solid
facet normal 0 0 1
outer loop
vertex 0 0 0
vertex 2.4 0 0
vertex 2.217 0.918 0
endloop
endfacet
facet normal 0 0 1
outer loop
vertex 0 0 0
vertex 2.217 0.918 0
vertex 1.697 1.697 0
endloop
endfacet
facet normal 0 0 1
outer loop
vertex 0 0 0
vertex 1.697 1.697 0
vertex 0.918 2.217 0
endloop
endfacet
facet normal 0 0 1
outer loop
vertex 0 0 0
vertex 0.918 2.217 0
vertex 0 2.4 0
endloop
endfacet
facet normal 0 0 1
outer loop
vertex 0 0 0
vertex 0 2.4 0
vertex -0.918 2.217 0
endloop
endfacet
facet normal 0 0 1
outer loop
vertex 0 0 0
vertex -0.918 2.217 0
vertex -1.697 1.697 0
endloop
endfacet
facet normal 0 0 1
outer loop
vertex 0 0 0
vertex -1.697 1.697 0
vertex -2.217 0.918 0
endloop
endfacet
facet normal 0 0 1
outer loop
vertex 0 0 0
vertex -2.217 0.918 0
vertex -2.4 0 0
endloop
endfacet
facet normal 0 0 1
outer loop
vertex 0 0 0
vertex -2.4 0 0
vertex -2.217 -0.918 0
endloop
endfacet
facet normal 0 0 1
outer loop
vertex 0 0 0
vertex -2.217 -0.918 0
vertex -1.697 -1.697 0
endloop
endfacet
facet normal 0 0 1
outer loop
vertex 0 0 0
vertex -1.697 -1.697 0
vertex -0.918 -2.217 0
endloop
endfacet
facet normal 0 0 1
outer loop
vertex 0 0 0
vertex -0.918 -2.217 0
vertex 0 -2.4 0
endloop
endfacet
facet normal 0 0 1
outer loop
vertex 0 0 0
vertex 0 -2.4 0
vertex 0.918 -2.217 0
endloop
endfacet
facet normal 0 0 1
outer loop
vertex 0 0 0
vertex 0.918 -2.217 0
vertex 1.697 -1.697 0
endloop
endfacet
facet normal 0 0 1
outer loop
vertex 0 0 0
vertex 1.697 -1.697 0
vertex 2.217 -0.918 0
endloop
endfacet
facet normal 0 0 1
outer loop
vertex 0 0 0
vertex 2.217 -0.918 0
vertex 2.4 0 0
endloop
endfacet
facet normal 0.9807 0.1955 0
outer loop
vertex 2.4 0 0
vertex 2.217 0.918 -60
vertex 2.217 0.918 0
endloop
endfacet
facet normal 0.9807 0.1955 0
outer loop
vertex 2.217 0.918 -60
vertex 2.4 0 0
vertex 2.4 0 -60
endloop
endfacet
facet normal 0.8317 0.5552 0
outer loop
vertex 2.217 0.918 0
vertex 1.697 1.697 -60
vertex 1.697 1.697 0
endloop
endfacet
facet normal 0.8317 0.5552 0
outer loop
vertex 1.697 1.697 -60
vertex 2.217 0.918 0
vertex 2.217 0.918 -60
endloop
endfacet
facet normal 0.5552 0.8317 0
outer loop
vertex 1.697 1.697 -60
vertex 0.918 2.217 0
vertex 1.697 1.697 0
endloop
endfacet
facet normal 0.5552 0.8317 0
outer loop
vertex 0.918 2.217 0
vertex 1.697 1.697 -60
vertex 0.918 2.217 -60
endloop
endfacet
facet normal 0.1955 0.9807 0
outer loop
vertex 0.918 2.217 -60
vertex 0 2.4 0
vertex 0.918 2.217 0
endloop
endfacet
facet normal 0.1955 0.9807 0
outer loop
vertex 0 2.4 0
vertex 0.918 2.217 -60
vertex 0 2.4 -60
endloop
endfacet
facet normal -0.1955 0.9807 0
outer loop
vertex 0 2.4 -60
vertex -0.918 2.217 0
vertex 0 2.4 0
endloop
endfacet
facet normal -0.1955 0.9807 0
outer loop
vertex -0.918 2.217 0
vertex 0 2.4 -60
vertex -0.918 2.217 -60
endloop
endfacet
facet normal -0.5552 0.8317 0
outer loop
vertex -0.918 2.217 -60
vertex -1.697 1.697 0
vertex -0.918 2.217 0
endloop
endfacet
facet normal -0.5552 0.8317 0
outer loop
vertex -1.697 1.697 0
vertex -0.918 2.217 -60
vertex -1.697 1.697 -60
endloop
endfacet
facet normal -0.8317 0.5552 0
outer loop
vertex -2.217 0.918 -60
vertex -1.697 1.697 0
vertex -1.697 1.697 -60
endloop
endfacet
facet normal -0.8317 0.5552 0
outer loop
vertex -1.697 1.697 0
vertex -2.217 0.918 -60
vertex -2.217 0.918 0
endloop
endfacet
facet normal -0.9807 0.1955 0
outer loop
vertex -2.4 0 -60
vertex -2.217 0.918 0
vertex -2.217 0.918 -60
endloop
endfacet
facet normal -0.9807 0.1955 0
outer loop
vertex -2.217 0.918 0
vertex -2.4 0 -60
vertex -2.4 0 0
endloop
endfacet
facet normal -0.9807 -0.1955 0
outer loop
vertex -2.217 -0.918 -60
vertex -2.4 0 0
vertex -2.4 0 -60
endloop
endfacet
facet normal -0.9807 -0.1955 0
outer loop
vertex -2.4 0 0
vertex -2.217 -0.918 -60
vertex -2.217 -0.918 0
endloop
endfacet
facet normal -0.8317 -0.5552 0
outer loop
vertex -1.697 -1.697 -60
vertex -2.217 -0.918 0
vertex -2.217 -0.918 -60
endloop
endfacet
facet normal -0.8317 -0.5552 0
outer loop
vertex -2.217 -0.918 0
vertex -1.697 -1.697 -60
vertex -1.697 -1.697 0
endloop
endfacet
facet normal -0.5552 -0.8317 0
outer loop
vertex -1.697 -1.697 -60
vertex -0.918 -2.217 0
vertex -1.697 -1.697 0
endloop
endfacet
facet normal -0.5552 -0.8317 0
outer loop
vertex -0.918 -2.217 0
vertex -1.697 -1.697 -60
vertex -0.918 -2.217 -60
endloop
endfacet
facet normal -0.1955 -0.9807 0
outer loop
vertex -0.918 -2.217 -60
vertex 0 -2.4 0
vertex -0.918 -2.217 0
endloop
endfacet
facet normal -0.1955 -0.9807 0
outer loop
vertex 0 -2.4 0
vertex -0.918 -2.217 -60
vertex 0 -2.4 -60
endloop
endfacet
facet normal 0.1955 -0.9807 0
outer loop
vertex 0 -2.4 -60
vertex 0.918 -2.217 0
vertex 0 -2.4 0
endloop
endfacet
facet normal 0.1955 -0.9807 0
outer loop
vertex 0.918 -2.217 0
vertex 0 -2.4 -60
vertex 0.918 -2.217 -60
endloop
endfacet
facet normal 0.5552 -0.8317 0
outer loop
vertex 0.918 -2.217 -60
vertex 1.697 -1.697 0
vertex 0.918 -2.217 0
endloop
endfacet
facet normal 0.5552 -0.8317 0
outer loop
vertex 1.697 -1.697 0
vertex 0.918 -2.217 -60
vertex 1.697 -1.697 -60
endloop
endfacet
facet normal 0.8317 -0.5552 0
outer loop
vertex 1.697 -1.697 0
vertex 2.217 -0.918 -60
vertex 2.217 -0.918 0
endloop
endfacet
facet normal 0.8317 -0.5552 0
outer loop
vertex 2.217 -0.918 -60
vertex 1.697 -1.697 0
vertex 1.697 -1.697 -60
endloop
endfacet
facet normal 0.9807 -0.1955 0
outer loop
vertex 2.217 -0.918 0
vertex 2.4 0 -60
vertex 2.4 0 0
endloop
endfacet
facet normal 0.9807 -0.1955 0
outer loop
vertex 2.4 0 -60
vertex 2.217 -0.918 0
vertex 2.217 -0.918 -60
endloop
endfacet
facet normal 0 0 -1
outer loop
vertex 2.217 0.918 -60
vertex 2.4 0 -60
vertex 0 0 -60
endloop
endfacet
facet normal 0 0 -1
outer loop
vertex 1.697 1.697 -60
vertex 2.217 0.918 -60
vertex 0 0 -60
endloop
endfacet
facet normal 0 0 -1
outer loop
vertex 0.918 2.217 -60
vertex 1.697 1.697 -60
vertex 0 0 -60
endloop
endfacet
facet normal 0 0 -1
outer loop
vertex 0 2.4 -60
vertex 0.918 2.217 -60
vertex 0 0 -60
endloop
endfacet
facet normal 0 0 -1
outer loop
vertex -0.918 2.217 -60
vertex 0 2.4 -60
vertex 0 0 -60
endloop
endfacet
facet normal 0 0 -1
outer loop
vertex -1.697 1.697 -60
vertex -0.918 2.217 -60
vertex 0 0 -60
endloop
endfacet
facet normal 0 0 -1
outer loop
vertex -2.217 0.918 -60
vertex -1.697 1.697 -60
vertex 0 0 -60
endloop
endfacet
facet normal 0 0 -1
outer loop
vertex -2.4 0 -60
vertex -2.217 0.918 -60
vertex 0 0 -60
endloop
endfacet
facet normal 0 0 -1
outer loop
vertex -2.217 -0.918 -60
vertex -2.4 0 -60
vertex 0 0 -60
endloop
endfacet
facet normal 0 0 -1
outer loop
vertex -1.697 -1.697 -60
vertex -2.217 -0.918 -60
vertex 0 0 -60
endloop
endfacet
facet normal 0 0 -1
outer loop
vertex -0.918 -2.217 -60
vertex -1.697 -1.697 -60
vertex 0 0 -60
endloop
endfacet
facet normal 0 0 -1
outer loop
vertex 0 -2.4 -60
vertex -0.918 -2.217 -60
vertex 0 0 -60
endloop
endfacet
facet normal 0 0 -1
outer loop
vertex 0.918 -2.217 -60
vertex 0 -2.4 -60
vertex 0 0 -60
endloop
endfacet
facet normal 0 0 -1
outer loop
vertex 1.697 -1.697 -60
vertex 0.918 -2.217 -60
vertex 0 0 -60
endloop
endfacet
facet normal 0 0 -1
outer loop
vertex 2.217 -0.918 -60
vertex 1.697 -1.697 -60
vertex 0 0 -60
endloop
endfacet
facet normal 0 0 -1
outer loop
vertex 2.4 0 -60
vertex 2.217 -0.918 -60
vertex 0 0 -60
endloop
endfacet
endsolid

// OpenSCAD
// file: ../p/4-4edge.scad
use <../lib.scad>
function ldraw_lib__4_4edge() = [
// 0 Circle 1.0
// 0 Name: 4-4edge.dat
// 0 Author: James Jessiman
// 0 !LDRAW_ORG Primitive UPDATE 2017-01
// 0 !LICENSE Licensed under CC BY 2.0 and CC BY 4.0 : see CAreadme.txt
// 
// 0 BFC CERTIFY CCW
  [0,"BFC","CERTIFY"],
  [0,"BFC","CCW"],
// 
// 0 !HISTORY 1998-12-15 [PTadmin] Official Update 1998-10
// 0 !HISTORY 2005-12-28 [PTadmin] Official Update 2005-01
// 0 !HISTORY 2007-06-24 [PTadmin] Header formatted for Contributor Agreement
// 0 !HISTORY 2008-07-01 [PTadmin] Official Update 2008-01
// 0 !HISTORY 2017-01-15 [Steffen] BFCed
// 0 !HISTORY 2017-12-30 [PTadmin] Official Update 2017-01
// 
// 
// 2 24 1 0 0 0.9239 0 0.3827
  [2,24,1,0,0,0.9239,0,0.3827],
// 2 24 0.9239 0 0.3827 0.7071 0 0.7071
  [2,24,0.9239,0,0.3827,0.7071,0,0.7071],
// 2 24 0.7071 0 0.7071 0.3827 0 0.9239
  [2,24,0.7071,0,0.7071,0.3827,0,0.9239],
// 2 24 0.3827 0 0.9239 0 0 1
  [2,24,0.3827,0,0.9239,0,0,1],
// 2 24 0 0 1 -0.3827 0 0.9239
  [2,24,0,0,1,-0.3827,0,0.9239],
// 2 24 -0.3827 0 0.9239 -0.7071 0 0.7071
  [2,24,-0.3827,0,0.9239,-0.7071,0,0.7071],
// 2 24 -0.7071 0 0.7071 -0.9239 0 0.3827
  [2,24,-0.7071,0,0.7071,-0.9239,0,0.3827],
// 2 24 -0.9239 0 0.3827 -1 0 -0
  [2,24,-0.9239,0,0.3827,-1,0,-0],
// 2 24 -1 0 -0 -0.9239 0 -0.3827
  [2,24,-1,0,-0,-0.9239,0,-0.3827],
// 2 24 -0.9239 0 -0.3827 -0.7071 0 -0.7071
  [2,24,-0.9239,0,-0.3827,-0.7071,0,-0.7071],
// 2 24 -0.7071 0 -0.7071 -0.3827 0 -0.9239
  [2,24,-0.7071,0,-0.7071,-0.3827,0,-0.9239],
// 2 24 -0.3827 0 -0.9239 0 0 -1
  [2,24,-0.3827,0,-0.9239,0,0,-1],
// 2 24 0 0 -1 0.3827 0 -0.9239
  [2,24,0,0,-1,0.3827,0,-0.9239],
// 2 24 0.3827 0 -0.9239 0.7071 0 -0.7071
  [2,24,0.3827,0,-0.9239,0.7071,0,-0.7071],
// 2 24 0.7071 0 -0.7071 0.9239 0 -0.3827
  [2,24,0.7071,0,-0.7071,0.9239,0,-0.3827],
// 2 24 0.9239 0 -0.3827 1 0 0
  [2,24,0.9239,0,-0.3827,1,0,0],
];
module ldraw_lib__4_4edge(step=0, col=false, unit=2/5, alt=false, line=0.2, solid=!$preview)
    makepoly(ldraw_lib__4_4edge(), step=step, col=col, unit=unit, alt=alt, line=line, solid=solid);
ldraw_lib__4_4edge(line=0.2);
// file: ../p/4-4cyli.scad
use <../lib.scad>
function ldraw_lib__4_4cyli() = [
// 0 Cylinder 1.0
// 0 Name: 4-4cyli.dat
// 0 Author: James Jessiman
// 0 !LDRAW_ORG Primitive UPDATE 2005-01
// 0 !LICENSE Licensed under CC BY 2.0 and CC BY 4.0 : see CAreadme.txt
// 
// 0 BFC CERTIFY CCW
  [0,"BFC","CERTIFY"],
  [0,"BFC","CCW"],
// 
// 0 !HISTORY 1998-12-15 [PTadmin] Official Update 1998-10
// 0 !HISTORY 2002-03-23 [sbliss] Added BFC statement; merged headers from files in distributions LDraw 0.27 and Complete.
// 0 !HISTORY 2002-04-25 [PTadmin] Official Update 2002-02
// 0 !HISTORY 2004-12-14 [guyvivan] BFC CCW
// 0 !HISTORY 2005-12-28 [PTadmin] Official Update 2005-01
// 0 !HISTORY 2007-06-24 [PTadmin] Header formatted for Contributor Agreement
// 0 !HISTORY 2008-07-01 [PTadmin] Official Update 2008-01
// 
// 
// 4 16 1 1 0 0.9239 1 0.3827 0.9239 0 0.3827 1 0 0
  [4,16,1,1,0,0.9239,1,0.3827,0.9239,0,0.3827,1,0,0],
// 5 24 1 0 0 1 1 0 0.9239 0 0.3827 0.9239 0 -0.3827
  [5,24,1,0,0,1,1,0,0.9239,0,0.3827,0.9239,0,-0.3827],
// 4 16 0.9239 1 0.3827 0.7071 1 0.7071 0.7071 0 0.7071 0.9239 0 0.3827
  [4,16,0.9239,1,0.3827,0.7071,1,0.7071,0.7071,0,0.7071,0.9239,0,0.3827],
// 5 24 0.9239 0 0.3827 0.9239 1 0.3827 0.7071 0 0.7071 1 0 0
  [5,24,0.9239,0,0.3827,0.9239,1,0.3827,0.7071,0,0.7071,1,0,0],
// 4 16 0.7071 1 0.7071 0.3827 1 0.9239 0.3827 0 0.9239 0.7071 0 0.7071
  [4,16,0.7071,1,0.7071,0.3827,1,0.9239,0.3827,0,0.9239,0.7071,0,0.7071],
// 5 24 0.7071 0 0.7071 0.7071 1 0.7071 0.3827 0 0.9239 0.9239 0 0.3827
  [5,24,0.7071,0,0.7071,0.7071,1,0.7071,0.3827,0,0.9239,0.9239,0,0.3827],
// 4 16 0.3827 1 0.9239 0 1 1 0 0 1 0.3827 0 0.9239
  [4,16,0.3827,1,0.9239,0,1,1,0,0,1,0.3827,0,0.9239],
// 5 24 0.3827 0 0.9239 0.3827 1 0.9239 0 0 1 0.7071 0 0.7071
  [5,24,0.3827,0,0.9239,0.3827,1,0.9239,0,0,1,0.7071,0,0.7071],
// 4 16 0 1 1 -0.3827 1 0.9239 -0.3827 0 0.9239 0 0 1
  [4,16,0,1,1,-0.3827,1,0.9239,-0.3827,0,0.9239,0,0,1],
// 5 24 0 0 1 0 1 1 -0.3827 0 0.9239 0.3827 0 0.9239
  [5,24,0,0,1,0,1,1,-0.3827,0,0.9239,0.3827,0,0.9239],
// 4 16 -0.3827 1 0.9239 -0.7071 1 0.7071 -0.7071 0 0.7071 -0.3827 0 0.9239
  [4,16,-0.3827,1,0.9239,-0.7071,1,0.7071,-0.7071,0,0.7071,-0.3827,0,0.9239],
// 5 24 -0.3827 0 0.9239 -0.3827 1 0.9239 -0.7071 0 0.7071 0 0 1
  [5,24,-0.3827,0,0.9239,-0.3827,1,0.9239,-0.7071,0,0.7071,0,0,1],
// 4 16 -0.7071 1 0.7071 -0.9239 1 0.3827 -0.9239 0 0.3827 -0.7071 0 0.7071
  [4,16,-0.7071,1,0.7071,-0.9239,1,0.3827,-0.9239,0,0.3827,-0.7071,0,0.7071],
// 5 24 -0.7071 0 0.7071 -0.7071 1 0.7071 -0.9239 0 0.3827 -0.3827 0 0.9239
  [5,24,-0.7071,0,0.7071,-0.7071,1,0.7071,-0.9239,0,0.3827,-0.3827,0,0.9239],
// 4 16 -0.9239 1 0.3827 -1 1 0 -1 0 0 -0.9239 0 0.3827
  [4,16,-0.9239,1,0.3827,-1,1,0,-1,0,0,-0.9239,0,0.3827],
// 5 24 -0.9239 0 0.3827 -0.9239 1 0.3827 -1 0 0 -0.7071 0 0.7071
  [5,24,-0.9239,0,0.3827,-0.9239,1,0.3827,-1,0,0,-0.7071,0,0.7071],
// 4 16 -1 1 0 -0.9239 1 -0.3827 -0.9239 0 -0.3827 -1 0 0
  [4,16,-1,1,0,-0.9239,1,-0.3827,-0.9239,0,-0.3827,-1,0,0],
// 5 24 -1 0 0 -1 1 0 -0.9239 0 -0.3827 -0.9239 0 0.3827
  [5,24,-1,0,0,-1,1,0,-0.9239,0,-0.3827,-0.9239,0,0.3827],
// 4 16 -0.9239 1 -0.3827 -0.7071 1 -0.7071 -0.7071 0 -0.7071 -0.9239 0 -0.3827
  [4,16,-0.9239,1,-0.3827,-0.7071,1,-0.7071,-0.7071,0,-0.7071,-0.9239,0,-0.3827],
// 5 24 -0.9239 0 -0.3827 -0.9239 1 -0.3827 -0.7071 0 -0.7071 -1 0 0
  [5,24,-0.9239,0,-0.3827,-0.9239,1,-0.3827,-0.7071,0,-0.7071,-1,0,0],
// 4 16 -0.7071 1 -0.7071 -0.3827 1 -0.9239 -0.3827 0 -0.9239 -0.7071 0 -0.7071
  [4,16,-0.7071,1,-0.7071,-0.3827,1,-0.9239,-0.3827,0,-0.9239,-0.7071,0,-0.7071],
// 5 24 -0.7071 0 -0.7071 -0.7071 1 -0.7071 -0.3827 0 -0.9239 -0.9239 0 -0.3827
  [5,24,-0.7071,0,-0.7071,-0.7071,1,-0.7071,-0.3827,0,-0.9239,-0.9239,0,-0.3827],
// 4 16 -0.3827 1 -0.9239 0 1 -1 0 0 -1 -0.3827 0 -0.9239
  [4,16,-0.3827,1,-0.9239,0,1,-1,0,0,-1,-0.3827,0,-0.9239],
// 5 24 -0.3827 0 -0.9239 -0.3827 1 -0.9239 0 0 -1 -0.7071 0 -0.7071
  [5,24,-0.3827,0,-0.9239,-0.3827,1,-0.9239,0,0,-1,-0.7071,0,-0.7071],
// 4 16 0 1 -1 0.3827 1 -0.9239 0.3827 0 -0.9239 0 0 -1
  [4,16,0,1,-1,0.3827,1,-0.9239,0.3827,0,-0.9239,0,0,-1],
// 5 24 0 0 -1 0 1 -1 0.3827 0 -0.9239 -0.3827 0 -0.9239
  [5,24,0,0,-1,0,1,-1,0.3827,0,-0.9239,-0.3827,0,-0.9239],
// 4 16 0.3827 1 -0.9239 0.7071 1 -0.7071 0.7071 0 -0.7071 0.3827 0 -0.9239
  [4,16,0.3827,1,-0.9239,0.7071,1,-0.7071,0.7071,0,-0.7071,0.3827,0,-0.9239],
// 5 24 0.3827 0 -0.9239 0.3827 1 -0.9239 0.7071 0 -0.7071 0 0 -1
  [5,24,0.3827,0,-0.9239,0.3827,1,-0.9239,0.7071,0,-0.7071,0,0,-1],
// 4 16 0.7071 1 -0.7071 0.9239 1 -0.3827 0.9239 0 -0.3827 0.7071 0 -0.7071
  [4,16,0.7071,1,-0.7071,0.9239,1,-0.3827,0.9239,0,-0.3827,0.7071,0,-0.7071],
// 5 24 0.7071 0 -0.7071 0.7071 1 -0.7071 0.9239 0 -0.3827 0.3827 0 -0.9239
  [5,24,0.7071,0,-0.7071,0.7071,1,-0.7071,0.9239,0,-0.3827,0.3827,0,-0.9239],
// 4 16 0.9239 1 -0.3827 1 1 0 1 0 0 0.9239 0 -0.3827
  [4,16,0.9239,1,-0.3827,1,1,0,1,0,0,0.9239,0,-0.3827],
// 5 24 0.9239 0 -0.3827 0.9239 1 -0.3827 1 0 0 0.7071 0 -0.7071
  [5,24,0.9239,0,-0.3827,0.9239,1,-0.3827,1,0,0,0.7071,0,-0.7071],
// 0
];
module ldraw_lib__4_4cyli(step=0, col=false, unit=2/5, alt=false, line=0.2, solid=!$preview)
    makepoly(ldraw_lib__4_4cyli(), step=step, col=col, unit=unit, alt=alt, line=line, solid=solid);
ldraw_lib__4_4cyli(line=0.2);
// file: ../p/4-4disc.scad
use <../lib.scad>
function ldraw_lib__4_4disc() = [
// 0 Disc 1.0
// 0 Name: 4-4disc.dat
// 0 Author: James Jessiman
// 0 !LDRAW_ORG Primitive UPDATE 2002-02
// 0 !LICENSE Licensed under CC BY 2.0 and CC BY 4.0 : see CAreadme.txt
// 
// 0 BFC CERTIFY CCW
  [0,"BFC","CERTIFY"],
  [0,"BFC","CCW"],
// 
// 0 !HISTORY 1998-12-15 [PTadmin] Official Update 1998-10
// 0 !HISTORY 2002-03-23 [sbliss] Added BFC statement
// 0 !HISTORY 2002-04-25 [PTadmin] Official Update 2002-02
// 0 !HISTORY 2007-06-24 [PTadmin] Header formatted for Contributor Agreement
// 0 !HISTORY 2008-07-01 [PTadmin] Official Update 2008-01
// 
// 
// 3 16 0 0 0 1 0 0 0.9239 0 0.3827
  [3,16,0,0,0,1,0,0,0.9239,0,0.3827],
// 3 16 0 0 0 0.9239 0 0.3827 0.7071 0 0.7071
  [3,16,0,0,0,0.9239,0,0.3827,0.7071,0,0.7071],
// 3 16 0 0 0 0.7071 0 0.7071 0.3827 0 0.9239
  [3,16,0,0,0,0.7071,0,0.7071,0.3827,0,0.9239],
// 3 16 0 0 0 0.3827 0 0.9239 0 0 1
  [3,16,0,0,0,0.3827,0,0.9239,0,0,1],
// 3 16 0 0 0 0 0 1 -0.3827 0 0.9239
  [3,16,0,0,0,0,0,1,-0.3827,0,0.9239],
// 3 16 0 0 0 -0.3827 0 0.9239 -0.7071 0 0.7071
  [3,16,0,0,0,-0.3827,0,0.9239,-0.7071,0,0.7071],
// 3 16 0 0 0 -0.7071 0 0.7071 -0.9239 0 0.3827
  [3,16,0,0,0,-0.7071,0,0.7071,-0.9239,0,0.3827],
// 3 16 0 0 0 -0.9239 0 0.3827 -1 0 -0
  [3,16,0,0,0,-0.9239,0,0.3827,-1,0,-0],
// 3 16 0 0 0 -1 0 -0 -0.9239 0 -0.3827
  [3,16,0,0,0,-1,0,-0,-0.9239,0,-0.3827],
// 3 16 0 0 0 -0.9239 0 -0.3827 -0.7071 0 -0.7071
  [3,16,0,0,0,-0.9239,0,-0.3827,-0.7071,0,-0.7071],
// 3 16 0 0 0 -0.7071 0 -0.7071 -0.3827 0 -0.9239
  [3,16,0,0,0,-0.7071,0,-0.7071,-0.3827,0,-0.9239],
// 3 16 0 0 0 -0.3827 0 -0.9239 0 0 -1
  [3,16,0,0,0,-0.3827,0,-0.9239,0,0,-1],
// 3 16 0 0 0 0 0 -1 0.3827 0 -0.9239
  [3,16,0,0,0,0,0,-1,0.3827,0,-0.9239],
// 3 16 0 0 0 0.3827 0 -0.9239 0.7071 0 -0.7071
  [3,16,0,0,0,0.3827,0,-0.9239,0.7071,0,-0.7071],
// 3 16 0 0 0 0.7071 0 -0.7071 0.9239 0 -0.3827
  [3,16,0,0,0,0.7071,0,-0.7071,0.9239,0,-0.3827],
// 3 16 0 0 0 0.9239 0 -0.3827 1 0 0
  [3,16,0,0,0,0.9239,0,-0.3827,1,0,0],
// 0
];
module ldraw_lib__4_4disc(step=0, col=false, unit=2/5, alt=false, line=0.2, solid=!$preview)
    makepoly(ldraw_lib__4_4disc(), step=step, col=col, unit=unit, alt=alt, line=line, solid=solid);
ldraw_lib__4_4disc(line=0.2);
// file: ../p/4-4cylc.scad
use <../lib.scad>
use <4-4cyli.scad>
use <4-4disc.scad>
use <4-4edge.scad>
function ldraw_lib__4_4cylc() = [
// 0 Cylinder Closed 1.0
// 0 Name: 4-4cylc.dat
// 0 Author: Alex Taylor [anathema]
// 0 !LDRAW_ORG Primitive UPDATE 2009-02
// 0 !LICENSE Licensed under CC BY 2.0 and CC BY 4.0 : see CAreadme.txt
// 
// 0 BFC CERTIFY CCW
  [0,"BFC","CERTIFY"],
  [0,"BFC","CCW"],
// 
// 0 !HISTORY 2008-12-29 [cwdee] Removed one disc
// 0 !HISTORY 2009-09-03 [PTadmin] Official Update 2009-02
// 
// 
// 1 16 0 0 0 1 0 0 0 1 0 0 0 1 4-4edge.dat
  [1,16,0,0,0,1,0,0,0,1,0,0,0,1, ldraw_lib__4_4edge()],
// 1 16 0 1 0 1 0 0 0 1 0 0 0 1 4-4edge.dat
  [1,16,0,1,0,1,0,0,0,1,0,0,0,1, ldraw_lib__4_4edge()],
// 1 16 0 0 0 1 0 0 0 1 0 0 0 1 4-4disc.dat
  [1,16,0,0,0,1,0,0,0,1,0,0,0,1, ldraw_lib__4_4disc()],
// 1 16 0 0 0 1 0 0 0 1 0 0 0 1 4-4cyli.dat
  [1,16,0,0,0,1,0,0,0,1,0,0,0,1, ldraw_lib__4_4cyli()],
// 0
];
module ldraw_lib__4_4cylc(step=0, col=false, unit=2/5, alt=false, line=0.2, solid=!$preview)
    makepoly(ldraw_lib__4_4cylc(), step=step, col=col, unit=unit, alt=alt, line=line, solid=solid);
ldraw_lib__4_4cylc(line=0.2);
// main file
use <../lib.scad>
use <../p/4-4cylc.scad>
use <../p/4-4disc.scad>
function ldraw_lib__u9113() = [
// 0 ~Technic Pneumatic Cylinder  2 x 11 Piston Rod
// 0 Name: u9113.dat
// 0 Author: Philippe Hurbain [Philo]
// 0 !LDRAW_ORG Part UPDATE 2018-01
// 0 !LICENSE Licensed under CC BY 2.0 and CC BY 4.0 : see CAreadme.txt
// 
// 0 BFC CERTIFY CCW
  [0,"BFC","CERTIFY"],
  [0,"BFC","CCW"],
// 
// 0 !HISTORY 2018-01-30 [PTadmin] Official Update 2018-01
// 
// 
// 1 16 0 0 0 6 0 0 0 150 0 0 0 6 4-4cylc.dat
  [1,16,0,0,0,6,0,0,0,150,0,0,0,6, ldraw_lib__4_4cylc()],
// 1 16 0 150 0 6 0 0 0 -1 0 0 0 6 4-4disc.dat
  [1,16,0,150,0,6,0,0,0,-1,0,0,0,6, ldraw_lib__4_4disc()],
];
module ldraw_lib__u9113(step=0, col=false, unit=2/5, alt=false, line=0.2, solid=!$preview)
    makepoly(ldraw_lib__u9113(), step=step, col=col, unit=unit, alt=alt, line=line, solid=solid);
ldraw_lib__u9113(line=0.2);
